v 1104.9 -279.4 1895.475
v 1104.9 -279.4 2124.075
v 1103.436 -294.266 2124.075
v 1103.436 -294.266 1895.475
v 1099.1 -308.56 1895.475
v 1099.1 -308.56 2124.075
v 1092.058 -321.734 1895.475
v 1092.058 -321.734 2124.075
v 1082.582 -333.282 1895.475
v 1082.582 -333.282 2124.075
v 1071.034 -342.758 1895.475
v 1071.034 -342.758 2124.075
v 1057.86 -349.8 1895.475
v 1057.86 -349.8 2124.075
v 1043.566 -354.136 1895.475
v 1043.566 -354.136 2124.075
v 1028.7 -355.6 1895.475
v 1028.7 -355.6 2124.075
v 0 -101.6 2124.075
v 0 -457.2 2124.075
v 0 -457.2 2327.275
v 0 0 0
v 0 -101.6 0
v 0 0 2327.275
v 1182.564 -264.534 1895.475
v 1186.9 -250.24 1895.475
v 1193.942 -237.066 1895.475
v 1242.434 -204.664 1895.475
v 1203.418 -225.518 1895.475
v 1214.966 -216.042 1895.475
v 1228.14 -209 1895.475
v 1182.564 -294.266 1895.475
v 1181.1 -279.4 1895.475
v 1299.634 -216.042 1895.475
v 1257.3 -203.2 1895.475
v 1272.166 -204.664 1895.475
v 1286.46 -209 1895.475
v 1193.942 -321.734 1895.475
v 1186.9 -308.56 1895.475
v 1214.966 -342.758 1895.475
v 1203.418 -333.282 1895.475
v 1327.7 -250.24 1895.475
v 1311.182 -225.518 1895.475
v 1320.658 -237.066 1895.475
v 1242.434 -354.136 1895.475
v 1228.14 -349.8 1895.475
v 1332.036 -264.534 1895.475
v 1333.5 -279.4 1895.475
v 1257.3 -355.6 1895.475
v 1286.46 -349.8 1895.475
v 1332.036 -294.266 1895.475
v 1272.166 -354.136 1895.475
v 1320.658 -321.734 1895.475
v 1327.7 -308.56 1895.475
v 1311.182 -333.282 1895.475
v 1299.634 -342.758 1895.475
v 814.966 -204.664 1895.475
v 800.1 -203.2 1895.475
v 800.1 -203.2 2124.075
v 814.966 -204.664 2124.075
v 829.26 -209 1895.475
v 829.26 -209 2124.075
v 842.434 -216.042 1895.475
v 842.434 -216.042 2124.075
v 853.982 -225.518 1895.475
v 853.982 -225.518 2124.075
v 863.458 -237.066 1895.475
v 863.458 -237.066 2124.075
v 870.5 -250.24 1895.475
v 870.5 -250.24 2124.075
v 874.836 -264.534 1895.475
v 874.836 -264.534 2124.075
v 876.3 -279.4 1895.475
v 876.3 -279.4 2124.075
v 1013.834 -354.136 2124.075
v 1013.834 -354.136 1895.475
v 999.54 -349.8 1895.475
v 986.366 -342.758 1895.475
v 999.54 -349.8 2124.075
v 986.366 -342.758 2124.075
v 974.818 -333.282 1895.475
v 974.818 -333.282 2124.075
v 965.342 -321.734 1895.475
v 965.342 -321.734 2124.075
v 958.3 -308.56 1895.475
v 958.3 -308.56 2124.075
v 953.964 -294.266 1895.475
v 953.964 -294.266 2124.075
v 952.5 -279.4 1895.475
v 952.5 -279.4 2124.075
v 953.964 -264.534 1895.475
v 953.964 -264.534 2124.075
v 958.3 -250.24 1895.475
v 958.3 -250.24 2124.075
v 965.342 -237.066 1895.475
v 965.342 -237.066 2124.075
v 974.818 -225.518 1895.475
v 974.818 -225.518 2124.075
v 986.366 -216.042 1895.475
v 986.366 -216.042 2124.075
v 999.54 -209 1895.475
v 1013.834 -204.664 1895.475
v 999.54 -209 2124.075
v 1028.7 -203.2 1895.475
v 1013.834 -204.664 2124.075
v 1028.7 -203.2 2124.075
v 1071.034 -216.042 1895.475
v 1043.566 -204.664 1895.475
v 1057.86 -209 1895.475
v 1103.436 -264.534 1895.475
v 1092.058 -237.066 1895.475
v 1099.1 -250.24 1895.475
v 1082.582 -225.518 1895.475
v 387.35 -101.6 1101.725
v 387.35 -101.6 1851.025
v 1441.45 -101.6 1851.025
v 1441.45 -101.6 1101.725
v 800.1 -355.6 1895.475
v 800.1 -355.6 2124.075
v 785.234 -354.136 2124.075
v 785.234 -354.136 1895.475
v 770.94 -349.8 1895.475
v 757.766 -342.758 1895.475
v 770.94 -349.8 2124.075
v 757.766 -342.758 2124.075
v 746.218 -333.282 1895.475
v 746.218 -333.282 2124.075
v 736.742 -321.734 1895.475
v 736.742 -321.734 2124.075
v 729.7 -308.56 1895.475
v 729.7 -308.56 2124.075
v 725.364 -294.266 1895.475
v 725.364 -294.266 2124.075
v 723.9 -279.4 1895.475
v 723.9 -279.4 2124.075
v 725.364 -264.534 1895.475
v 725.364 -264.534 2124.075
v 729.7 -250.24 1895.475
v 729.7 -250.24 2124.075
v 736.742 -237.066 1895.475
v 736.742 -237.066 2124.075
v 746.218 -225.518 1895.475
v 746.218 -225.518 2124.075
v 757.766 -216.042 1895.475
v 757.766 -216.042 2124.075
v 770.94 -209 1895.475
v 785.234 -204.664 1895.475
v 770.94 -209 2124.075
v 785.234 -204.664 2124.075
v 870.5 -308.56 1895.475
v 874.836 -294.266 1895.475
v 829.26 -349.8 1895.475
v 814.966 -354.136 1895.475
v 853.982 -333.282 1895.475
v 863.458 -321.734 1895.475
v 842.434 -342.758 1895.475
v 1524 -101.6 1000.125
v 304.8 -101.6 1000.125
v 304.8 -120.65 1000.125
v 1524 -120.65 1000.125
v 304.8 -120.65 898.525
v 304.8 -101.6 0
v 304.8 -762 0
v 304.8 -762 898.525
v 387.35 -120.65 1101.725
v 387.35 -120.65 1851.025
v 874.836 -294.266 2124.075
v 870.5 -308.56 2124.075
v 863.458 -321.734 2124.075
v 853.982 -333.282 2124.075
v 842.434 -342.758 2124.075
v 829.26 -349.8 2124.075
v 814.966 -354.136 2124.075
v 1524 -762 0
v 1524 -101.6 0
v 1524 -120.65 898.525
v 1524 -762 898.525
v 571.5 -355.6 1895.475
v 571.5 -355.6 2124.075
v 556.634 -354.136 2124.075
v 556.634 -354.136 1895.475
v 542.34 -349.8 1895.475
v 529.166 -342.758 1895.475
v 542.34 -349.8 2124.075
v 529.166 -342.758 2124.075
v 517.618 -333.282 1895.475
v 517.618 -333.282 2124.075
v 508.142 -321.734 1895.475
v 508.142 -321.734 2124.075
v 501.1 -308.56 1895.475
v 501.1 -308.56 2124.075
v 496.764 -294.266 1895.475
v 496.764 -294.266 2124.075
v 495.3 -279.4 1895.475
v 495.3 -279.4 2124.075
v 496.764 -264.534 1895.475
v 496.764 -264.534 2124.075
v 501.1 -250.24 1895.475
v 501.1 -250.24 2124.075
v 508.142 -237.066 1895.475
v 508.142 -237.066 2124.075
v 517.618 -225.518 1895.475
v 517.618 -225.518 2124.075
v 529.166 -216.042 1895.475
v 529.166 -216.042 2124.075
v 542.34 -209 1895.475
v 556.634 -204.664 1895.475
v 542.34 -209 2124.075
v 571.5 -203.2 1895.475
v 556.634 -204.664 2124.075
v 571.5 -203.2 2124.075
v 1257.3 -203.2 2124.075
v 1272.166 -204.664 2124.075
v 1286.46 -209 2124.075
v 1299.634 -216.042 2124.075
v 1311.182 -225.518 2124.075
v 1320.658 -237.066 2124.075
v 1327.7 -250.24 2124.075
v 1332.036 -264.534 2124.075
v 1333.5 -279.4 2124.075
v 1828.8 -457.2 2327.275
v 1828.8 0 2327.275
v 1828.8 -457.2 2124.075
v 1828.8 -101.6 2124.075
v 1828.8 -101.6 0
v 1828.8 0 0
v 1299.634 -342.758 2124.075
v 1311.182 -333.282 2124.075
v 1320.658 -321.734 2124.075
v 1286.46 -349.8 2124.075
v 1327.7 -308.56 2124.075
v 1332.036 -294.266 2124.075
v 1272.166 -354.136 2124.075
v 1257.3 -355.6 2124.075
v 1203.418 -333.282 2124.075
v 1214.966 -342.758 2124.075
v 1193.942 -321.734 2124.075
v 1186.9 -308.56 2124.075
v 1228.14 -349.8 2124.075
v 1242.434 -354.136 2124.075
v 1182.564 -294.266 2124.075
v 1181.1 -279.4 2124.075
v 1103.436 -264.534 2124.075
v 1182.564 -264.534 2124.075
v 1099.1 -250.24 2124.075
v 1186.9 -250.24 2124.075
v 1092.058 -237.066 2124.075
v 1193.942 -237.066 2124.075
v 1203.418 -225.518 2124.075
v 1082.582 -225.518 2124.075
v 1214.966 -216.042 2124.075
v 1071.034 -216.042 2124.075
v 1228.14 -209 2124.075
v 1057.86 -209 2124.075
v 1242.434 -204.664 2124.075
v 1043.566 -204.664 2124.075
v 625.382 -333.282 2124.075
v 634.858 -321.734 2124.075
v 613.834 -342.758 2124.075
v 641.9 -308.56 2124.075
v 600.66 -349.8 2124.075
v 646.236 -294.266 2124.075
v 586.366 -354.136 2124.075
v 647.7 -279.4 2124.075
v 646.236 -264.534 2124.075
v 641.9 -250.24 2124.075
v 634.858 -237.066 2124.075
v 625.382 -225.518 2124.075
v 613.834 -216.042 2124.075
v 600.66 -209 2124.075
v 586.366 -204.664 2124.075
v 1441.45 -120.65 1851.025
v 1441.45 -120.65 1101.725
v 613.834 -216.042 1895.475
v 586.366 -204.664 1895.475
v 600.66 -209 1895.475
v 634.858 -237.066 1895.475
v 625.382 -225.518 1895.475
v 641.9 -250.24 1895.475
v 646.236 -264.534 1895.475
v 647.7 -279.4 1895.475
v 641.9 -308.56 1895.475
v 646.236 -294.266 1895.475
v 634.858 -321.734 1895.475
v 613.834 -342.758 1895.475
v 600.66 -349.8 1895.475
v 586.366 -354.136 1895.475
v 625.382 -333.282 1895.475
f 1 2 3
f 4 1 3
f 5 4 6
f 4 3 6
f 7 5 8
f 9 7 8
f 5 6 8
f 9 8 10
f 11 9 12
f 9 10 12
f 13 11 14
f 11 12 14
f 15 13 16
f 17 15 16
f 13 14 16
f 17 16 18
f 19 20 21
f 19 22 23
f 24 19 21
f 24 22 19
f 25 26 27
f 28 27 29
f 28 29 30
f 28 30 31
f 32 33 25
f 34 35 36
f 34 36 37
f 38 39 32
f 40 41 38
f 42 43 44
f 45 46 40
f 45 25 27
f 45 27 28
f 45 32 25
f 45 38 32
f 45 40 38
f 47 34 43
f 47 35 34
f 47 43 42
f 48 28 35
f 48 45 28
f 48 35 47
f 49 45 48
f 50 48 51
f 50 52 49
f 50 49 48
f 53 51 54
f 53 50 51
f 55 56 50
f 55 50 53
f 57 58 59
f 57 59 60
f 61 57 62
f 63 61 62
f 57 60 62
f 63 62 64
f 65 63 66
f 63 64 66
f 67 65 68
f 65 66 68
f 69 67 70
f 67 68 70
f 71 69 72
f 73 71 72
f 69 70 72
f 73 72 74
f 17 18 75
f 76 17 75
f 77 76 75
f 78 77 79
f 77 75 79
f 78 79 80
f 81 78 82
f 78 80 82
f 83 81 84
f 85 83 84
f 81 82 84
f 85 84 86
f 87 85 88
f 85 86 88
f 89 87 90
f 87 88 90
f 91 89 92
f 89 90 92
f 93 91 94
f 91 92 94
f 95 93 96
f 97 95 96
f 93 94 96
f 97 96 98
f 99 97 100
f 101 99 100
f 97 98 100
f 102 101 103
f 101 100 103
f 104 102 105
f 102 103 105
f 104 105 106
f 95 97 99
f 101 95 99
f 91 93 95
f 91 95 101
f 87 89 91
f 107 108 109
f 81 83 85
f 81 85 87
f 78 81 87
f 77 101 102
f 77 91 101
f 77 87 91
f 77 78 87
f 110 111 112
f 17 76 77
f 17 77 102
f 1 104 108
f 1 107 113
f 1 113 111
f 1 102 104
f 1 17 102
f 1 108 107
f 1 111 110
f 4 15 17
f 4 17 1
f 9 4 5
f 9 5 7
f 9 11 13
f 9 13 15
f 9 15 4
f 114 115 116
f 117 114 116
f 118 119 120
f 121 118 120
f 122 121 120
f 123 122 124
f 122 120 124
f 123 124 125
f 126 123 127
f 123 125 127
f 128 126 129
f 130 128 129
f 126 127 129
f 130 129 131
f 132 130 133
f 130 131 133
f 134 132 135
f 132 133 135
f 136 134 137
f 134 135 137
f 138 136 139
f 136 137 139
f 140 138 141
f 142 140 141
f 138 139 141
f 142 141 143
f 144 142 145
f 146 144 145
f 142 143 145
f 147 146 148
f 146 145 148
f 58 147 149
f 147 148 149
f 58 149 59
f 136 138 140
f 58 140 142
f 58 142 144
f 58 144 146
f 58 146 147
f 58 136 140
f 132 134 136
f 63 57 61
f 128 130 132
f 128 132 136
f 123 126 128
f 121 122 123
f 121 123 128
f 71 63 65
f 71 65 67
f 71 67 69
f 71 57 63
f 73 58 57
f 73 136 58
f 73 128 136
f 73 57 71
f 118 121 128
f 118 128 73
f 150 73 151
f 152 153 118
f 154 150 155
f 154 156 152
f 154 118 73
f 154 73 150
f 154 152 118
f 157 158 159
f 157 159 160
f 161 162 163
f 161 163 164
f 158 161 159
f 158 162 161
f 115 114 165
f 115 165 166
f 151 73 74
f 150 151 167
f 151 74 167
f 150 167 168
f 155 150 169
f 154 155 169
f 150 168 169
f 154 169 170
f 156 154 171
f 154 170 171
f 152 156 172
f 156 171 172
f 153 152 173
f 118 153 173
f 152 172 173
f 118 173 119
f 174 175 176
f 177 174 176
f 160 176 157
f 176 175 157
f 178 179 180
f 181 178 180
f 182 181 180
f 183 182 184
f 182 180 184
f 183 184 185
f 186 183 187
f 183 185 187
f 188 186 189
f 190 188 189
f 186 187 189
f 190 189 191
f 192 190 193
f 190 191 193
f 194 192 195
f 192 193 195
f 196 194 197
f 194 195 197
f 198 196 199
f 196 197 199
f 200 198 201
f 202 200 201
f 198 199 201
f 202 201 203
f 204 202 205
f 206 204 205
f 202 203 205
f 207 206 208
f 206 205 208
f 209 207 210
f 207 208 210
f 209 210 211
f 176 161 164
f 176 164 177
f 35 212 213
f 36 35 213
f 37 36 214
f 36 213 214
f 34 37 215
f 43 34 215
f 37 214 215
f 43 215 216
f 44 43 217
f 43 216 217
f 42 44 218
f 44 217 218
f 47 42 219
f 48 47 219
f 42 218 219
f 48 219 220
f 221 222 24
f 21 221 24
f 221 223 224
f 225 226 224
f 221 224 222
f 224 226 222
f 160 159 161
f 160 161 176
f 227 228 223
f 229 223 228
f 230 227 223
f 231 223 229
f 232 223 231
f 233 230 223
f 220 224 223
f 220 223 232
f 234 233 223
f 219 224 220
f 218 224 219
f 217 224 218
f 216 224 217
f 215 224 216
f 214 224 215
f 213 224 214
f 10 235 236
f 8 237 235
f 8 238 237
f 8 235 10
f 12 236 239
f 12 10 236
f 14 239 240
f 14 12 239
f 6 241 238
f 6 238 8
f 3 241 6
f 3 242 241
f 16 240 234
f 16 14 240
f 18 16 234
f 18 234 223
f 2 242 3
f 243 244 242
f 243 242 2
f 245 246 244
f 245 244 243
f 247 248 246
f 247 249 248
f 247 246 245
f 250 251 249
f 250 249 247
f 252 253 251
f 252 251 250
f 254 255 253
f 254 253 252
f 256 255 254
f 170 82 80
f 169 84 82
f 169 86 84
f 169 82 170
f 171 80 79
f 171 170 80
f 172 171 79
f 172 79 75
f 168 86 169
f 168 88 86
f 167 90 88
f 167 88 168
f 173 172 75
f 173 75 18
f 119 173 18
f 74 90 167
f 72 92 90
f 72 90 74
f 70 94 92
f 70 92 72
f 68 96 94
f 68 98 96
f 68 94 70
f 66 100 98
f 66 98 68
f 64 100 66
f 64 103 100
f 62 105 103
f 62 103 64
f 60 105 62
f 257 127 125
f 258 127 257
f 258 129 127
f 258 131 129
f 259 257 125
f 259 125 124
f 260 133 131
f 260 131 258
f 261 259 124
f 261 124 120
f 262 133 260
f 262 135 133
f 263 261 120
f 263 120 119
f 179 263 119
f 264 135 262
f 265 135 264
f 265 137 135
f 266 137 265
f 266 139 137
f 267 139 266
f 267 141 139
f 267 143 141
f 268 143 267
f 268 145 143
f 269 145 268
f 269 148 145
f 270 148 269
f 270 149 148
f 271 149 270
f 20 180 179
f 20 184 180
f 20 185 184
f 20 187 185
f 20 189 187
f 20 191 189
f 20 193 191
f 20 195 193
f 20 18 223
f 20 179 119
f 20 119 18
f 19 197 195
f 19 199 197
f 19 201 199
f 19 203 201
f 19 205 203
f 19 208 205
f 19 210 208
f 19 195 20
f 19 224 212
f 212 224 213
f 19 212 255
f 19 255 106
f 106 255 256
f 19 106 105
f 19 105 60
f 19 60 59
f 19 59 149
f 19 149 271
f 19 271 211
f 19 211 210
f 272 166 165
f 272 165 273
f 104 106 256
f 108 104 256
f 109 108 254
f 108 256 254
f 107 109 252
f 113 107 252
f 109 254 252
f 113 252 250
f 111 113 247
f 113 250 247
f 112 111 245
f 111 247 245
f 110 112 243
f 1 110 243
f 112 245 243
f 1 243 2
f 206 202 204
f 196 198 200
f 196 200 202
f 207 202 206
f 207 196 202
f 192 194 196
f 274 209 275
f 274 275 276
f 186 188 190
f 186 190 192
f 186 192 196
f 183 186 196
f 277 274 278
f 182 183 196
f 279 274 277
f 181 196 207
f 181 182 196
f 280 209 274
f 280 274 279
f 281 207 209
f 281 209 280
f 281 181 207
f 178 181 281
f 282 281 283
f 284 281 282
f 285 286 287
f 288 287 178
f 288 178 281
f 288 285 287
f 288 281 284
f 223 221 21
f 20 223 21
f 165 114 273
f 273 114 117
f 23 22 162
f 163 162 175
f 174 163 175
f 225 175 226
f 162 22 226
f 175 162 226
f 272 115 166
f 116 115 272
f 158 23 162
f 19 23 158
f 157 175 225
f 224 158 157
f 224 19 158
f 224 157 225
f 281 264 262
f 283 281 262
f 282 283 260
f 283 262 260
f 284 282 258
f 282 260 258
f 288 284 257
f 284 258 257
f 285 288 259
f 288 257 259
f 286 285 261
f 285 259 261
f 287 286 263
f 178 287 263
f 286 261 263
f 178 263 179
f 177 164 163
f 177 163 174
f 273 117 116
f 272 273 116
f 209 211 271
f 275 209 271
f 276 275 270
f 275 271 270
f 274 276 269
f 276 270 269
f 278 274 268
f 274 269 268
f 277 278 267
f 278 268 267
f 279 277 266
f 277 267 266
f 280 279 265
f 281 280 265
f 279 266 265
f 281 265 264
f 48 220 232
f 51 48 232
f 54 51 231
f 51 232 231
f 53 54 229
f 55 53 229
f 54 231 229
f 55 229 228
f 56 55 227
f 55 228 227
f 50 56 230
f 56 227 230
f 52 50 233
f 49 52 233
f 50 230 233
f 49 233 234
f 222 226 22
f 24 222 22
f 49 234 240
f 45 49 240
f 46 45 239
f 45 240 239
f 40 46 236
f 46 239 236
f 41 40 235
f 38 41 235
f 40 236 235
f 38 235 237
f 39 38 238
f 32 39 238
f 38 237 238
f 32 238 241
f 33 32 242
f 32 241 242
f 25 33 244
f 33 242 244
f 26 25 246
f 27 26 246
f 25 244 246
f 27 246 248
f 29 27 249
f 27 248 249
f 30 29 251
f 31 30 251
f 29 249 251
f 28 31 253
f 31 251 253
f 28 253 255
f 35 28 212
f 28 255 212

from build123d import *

# Parameters (mm, degrees)
F0_W      = 1828.8
F0_H      = 2133.6
F1_DEPTH  = 101.6
F2_W      = 1219.2
F2_H      = 898.525
F3_DEPTH  = 660.4
F4_W      = 1219.2
F4_H      = 101.6
F5_DEPTH  = 19.05
F6_W      = 1828.8
F6_H      = 9.525
F7_DEPTH  = 101.601
F8_W      = 1054.1
F8_H      = 749.3
F9_DEPTH  = 19.05
F10_W     = 1828.8
F10_H     = 203.2
F11_DEPTH = 457.2
F13_DEPTH = 228.6


with BuildPart() as f1:
    # F0 (on Front) → F1 (new body)
    with BuildSketch(Plane.XZ):
        with Locations((914.4, 1066.8)):
            Rectangle(F0_W, F0_H)
    extrude(amount=F1_DEPTH)

    # F2 (on face) → F3 (join)
    with BuildSketch(Plane.XZ.offset(101.6)):
        with Locations((914.4, 449.2625)):
            Rectangle(F2_W, F2_H)
    extrude(amount=F3_DEPTH)

    # F4 (on face) → F5 (join)
    with BuildSketch(Plane.XZ.offset(101.6)):
        with Locations((914.4, 949.325)):
            Rectangle(F4_W, F4_H)
    extrude(amount=F5_DEPTH)

    # F6 (on face) → F7 (cut, through all)
    with BuildSketch(Plane.XZ.offset(101.6)):
        with Locations((914.4, 2128.8375)):
            Rectangle(F6_W, F6_H)
    extrude(amount=-F7_DEPTH, mode=Mode.SUBTRACT)

    # F10 (on face) → F11 (join)
    with BuildSketch(Plane(origin=(0, 0, 0), x_dir=(-1, 0, 0), z_dir=(0, 1, 0))):
        with Locations((-914.4, 2225.675)):
            Rectangle(F10_W, F10_H)
    extrude(amount=-F11_DEPTH)

    # F12 (on face) → F13 (join)
    with BuildSketch(Plane(origin=(0, 0, 2124.075), x_dir=(1, 0, 0), z_dir=(0, 0, -1))):
        with BuildLine():
            ThreePointArc((571.5, 355.6), (495.3, 279.4), (571.5, 203.2))
            Line((571.5, 203.2), (571.5, 355.6))
        make_face()
        with BuildLine():
            ThreePointArc((800.1, 355.6), (723.9, 279.4), (800.1, 203.2))
            Line((800.1, 203.2), (800.1, 355.6))
        make_face()
        with BuildLine():
            Line((1028.7, 355.6), (1028.7, 203.2))
            ThreePointArc((1028.7, 203.2), (1082.581537, 225.518463), (1104.9, 279.4))
            ThreePointArc((1104.9, 279.4), (1082.581537, 333.281537), (1028.7, 355.6))
        make_face()
        with BuildLine():
            ThreePointArc((1028.7, 355.6), (952.5, 279.4), (1028.7, 203.2))
            Line((1028.7, 203.2), (1028.7, 355.6))
        make_face()
        with BuildLine():
            Line((800.1, 355.6), (800.1, 203.2))
            ThreePointArc((800.1, 203.2), (853.981537, 225.518463), (876.3, 279.4))
            ThreePointArc((876.3, 279.4), (853.981537, 333.281537), (800.1, 355.6))
        make_face()
        with BuildLine():
            Line((571.5, 355.6), (571.5, 203.2))
            ThreePointArc((571.5, 203.2), (625.381537, 225.518463), (647.7, 279.4))
            ThreePointArc((647.7, 279.4), (625.381537, 333.281537), (571.5, 355.6))
        make_face()
        with BuildLine():
            ThreePointArc((1257.3, 355.6), (1181.1, 279.4), (1257.3, 203.2))
            Line((1257.3, 203.2), (1257.3, 355.6))
        make_face()
        with BuildLine():
            Line((1257.3, 355.6), (1257.3, 203.2))
            ThreePointArc((1257.3, 203.2), (1311.181537, 225.518463), (1333.5, 279.4))
            ThreePointArc((1333.5, 279.4), (1311.181537, 333.281537), (1257.3, 355.6))
        make_face()
    extrude(amount=F13_DEPTH)


with BuildPart() as f9:
    # F8 (on face) → F9 (new body)
    with BuildSketch(Plane.XZ.offset(101.6)):
        with Locations((914.4, 1476.375)):
            Rectangle(F8_W, F8_H)
    extrude(amount=F9_DEPTH)


solid = Compound([f1.part, f9.part])
